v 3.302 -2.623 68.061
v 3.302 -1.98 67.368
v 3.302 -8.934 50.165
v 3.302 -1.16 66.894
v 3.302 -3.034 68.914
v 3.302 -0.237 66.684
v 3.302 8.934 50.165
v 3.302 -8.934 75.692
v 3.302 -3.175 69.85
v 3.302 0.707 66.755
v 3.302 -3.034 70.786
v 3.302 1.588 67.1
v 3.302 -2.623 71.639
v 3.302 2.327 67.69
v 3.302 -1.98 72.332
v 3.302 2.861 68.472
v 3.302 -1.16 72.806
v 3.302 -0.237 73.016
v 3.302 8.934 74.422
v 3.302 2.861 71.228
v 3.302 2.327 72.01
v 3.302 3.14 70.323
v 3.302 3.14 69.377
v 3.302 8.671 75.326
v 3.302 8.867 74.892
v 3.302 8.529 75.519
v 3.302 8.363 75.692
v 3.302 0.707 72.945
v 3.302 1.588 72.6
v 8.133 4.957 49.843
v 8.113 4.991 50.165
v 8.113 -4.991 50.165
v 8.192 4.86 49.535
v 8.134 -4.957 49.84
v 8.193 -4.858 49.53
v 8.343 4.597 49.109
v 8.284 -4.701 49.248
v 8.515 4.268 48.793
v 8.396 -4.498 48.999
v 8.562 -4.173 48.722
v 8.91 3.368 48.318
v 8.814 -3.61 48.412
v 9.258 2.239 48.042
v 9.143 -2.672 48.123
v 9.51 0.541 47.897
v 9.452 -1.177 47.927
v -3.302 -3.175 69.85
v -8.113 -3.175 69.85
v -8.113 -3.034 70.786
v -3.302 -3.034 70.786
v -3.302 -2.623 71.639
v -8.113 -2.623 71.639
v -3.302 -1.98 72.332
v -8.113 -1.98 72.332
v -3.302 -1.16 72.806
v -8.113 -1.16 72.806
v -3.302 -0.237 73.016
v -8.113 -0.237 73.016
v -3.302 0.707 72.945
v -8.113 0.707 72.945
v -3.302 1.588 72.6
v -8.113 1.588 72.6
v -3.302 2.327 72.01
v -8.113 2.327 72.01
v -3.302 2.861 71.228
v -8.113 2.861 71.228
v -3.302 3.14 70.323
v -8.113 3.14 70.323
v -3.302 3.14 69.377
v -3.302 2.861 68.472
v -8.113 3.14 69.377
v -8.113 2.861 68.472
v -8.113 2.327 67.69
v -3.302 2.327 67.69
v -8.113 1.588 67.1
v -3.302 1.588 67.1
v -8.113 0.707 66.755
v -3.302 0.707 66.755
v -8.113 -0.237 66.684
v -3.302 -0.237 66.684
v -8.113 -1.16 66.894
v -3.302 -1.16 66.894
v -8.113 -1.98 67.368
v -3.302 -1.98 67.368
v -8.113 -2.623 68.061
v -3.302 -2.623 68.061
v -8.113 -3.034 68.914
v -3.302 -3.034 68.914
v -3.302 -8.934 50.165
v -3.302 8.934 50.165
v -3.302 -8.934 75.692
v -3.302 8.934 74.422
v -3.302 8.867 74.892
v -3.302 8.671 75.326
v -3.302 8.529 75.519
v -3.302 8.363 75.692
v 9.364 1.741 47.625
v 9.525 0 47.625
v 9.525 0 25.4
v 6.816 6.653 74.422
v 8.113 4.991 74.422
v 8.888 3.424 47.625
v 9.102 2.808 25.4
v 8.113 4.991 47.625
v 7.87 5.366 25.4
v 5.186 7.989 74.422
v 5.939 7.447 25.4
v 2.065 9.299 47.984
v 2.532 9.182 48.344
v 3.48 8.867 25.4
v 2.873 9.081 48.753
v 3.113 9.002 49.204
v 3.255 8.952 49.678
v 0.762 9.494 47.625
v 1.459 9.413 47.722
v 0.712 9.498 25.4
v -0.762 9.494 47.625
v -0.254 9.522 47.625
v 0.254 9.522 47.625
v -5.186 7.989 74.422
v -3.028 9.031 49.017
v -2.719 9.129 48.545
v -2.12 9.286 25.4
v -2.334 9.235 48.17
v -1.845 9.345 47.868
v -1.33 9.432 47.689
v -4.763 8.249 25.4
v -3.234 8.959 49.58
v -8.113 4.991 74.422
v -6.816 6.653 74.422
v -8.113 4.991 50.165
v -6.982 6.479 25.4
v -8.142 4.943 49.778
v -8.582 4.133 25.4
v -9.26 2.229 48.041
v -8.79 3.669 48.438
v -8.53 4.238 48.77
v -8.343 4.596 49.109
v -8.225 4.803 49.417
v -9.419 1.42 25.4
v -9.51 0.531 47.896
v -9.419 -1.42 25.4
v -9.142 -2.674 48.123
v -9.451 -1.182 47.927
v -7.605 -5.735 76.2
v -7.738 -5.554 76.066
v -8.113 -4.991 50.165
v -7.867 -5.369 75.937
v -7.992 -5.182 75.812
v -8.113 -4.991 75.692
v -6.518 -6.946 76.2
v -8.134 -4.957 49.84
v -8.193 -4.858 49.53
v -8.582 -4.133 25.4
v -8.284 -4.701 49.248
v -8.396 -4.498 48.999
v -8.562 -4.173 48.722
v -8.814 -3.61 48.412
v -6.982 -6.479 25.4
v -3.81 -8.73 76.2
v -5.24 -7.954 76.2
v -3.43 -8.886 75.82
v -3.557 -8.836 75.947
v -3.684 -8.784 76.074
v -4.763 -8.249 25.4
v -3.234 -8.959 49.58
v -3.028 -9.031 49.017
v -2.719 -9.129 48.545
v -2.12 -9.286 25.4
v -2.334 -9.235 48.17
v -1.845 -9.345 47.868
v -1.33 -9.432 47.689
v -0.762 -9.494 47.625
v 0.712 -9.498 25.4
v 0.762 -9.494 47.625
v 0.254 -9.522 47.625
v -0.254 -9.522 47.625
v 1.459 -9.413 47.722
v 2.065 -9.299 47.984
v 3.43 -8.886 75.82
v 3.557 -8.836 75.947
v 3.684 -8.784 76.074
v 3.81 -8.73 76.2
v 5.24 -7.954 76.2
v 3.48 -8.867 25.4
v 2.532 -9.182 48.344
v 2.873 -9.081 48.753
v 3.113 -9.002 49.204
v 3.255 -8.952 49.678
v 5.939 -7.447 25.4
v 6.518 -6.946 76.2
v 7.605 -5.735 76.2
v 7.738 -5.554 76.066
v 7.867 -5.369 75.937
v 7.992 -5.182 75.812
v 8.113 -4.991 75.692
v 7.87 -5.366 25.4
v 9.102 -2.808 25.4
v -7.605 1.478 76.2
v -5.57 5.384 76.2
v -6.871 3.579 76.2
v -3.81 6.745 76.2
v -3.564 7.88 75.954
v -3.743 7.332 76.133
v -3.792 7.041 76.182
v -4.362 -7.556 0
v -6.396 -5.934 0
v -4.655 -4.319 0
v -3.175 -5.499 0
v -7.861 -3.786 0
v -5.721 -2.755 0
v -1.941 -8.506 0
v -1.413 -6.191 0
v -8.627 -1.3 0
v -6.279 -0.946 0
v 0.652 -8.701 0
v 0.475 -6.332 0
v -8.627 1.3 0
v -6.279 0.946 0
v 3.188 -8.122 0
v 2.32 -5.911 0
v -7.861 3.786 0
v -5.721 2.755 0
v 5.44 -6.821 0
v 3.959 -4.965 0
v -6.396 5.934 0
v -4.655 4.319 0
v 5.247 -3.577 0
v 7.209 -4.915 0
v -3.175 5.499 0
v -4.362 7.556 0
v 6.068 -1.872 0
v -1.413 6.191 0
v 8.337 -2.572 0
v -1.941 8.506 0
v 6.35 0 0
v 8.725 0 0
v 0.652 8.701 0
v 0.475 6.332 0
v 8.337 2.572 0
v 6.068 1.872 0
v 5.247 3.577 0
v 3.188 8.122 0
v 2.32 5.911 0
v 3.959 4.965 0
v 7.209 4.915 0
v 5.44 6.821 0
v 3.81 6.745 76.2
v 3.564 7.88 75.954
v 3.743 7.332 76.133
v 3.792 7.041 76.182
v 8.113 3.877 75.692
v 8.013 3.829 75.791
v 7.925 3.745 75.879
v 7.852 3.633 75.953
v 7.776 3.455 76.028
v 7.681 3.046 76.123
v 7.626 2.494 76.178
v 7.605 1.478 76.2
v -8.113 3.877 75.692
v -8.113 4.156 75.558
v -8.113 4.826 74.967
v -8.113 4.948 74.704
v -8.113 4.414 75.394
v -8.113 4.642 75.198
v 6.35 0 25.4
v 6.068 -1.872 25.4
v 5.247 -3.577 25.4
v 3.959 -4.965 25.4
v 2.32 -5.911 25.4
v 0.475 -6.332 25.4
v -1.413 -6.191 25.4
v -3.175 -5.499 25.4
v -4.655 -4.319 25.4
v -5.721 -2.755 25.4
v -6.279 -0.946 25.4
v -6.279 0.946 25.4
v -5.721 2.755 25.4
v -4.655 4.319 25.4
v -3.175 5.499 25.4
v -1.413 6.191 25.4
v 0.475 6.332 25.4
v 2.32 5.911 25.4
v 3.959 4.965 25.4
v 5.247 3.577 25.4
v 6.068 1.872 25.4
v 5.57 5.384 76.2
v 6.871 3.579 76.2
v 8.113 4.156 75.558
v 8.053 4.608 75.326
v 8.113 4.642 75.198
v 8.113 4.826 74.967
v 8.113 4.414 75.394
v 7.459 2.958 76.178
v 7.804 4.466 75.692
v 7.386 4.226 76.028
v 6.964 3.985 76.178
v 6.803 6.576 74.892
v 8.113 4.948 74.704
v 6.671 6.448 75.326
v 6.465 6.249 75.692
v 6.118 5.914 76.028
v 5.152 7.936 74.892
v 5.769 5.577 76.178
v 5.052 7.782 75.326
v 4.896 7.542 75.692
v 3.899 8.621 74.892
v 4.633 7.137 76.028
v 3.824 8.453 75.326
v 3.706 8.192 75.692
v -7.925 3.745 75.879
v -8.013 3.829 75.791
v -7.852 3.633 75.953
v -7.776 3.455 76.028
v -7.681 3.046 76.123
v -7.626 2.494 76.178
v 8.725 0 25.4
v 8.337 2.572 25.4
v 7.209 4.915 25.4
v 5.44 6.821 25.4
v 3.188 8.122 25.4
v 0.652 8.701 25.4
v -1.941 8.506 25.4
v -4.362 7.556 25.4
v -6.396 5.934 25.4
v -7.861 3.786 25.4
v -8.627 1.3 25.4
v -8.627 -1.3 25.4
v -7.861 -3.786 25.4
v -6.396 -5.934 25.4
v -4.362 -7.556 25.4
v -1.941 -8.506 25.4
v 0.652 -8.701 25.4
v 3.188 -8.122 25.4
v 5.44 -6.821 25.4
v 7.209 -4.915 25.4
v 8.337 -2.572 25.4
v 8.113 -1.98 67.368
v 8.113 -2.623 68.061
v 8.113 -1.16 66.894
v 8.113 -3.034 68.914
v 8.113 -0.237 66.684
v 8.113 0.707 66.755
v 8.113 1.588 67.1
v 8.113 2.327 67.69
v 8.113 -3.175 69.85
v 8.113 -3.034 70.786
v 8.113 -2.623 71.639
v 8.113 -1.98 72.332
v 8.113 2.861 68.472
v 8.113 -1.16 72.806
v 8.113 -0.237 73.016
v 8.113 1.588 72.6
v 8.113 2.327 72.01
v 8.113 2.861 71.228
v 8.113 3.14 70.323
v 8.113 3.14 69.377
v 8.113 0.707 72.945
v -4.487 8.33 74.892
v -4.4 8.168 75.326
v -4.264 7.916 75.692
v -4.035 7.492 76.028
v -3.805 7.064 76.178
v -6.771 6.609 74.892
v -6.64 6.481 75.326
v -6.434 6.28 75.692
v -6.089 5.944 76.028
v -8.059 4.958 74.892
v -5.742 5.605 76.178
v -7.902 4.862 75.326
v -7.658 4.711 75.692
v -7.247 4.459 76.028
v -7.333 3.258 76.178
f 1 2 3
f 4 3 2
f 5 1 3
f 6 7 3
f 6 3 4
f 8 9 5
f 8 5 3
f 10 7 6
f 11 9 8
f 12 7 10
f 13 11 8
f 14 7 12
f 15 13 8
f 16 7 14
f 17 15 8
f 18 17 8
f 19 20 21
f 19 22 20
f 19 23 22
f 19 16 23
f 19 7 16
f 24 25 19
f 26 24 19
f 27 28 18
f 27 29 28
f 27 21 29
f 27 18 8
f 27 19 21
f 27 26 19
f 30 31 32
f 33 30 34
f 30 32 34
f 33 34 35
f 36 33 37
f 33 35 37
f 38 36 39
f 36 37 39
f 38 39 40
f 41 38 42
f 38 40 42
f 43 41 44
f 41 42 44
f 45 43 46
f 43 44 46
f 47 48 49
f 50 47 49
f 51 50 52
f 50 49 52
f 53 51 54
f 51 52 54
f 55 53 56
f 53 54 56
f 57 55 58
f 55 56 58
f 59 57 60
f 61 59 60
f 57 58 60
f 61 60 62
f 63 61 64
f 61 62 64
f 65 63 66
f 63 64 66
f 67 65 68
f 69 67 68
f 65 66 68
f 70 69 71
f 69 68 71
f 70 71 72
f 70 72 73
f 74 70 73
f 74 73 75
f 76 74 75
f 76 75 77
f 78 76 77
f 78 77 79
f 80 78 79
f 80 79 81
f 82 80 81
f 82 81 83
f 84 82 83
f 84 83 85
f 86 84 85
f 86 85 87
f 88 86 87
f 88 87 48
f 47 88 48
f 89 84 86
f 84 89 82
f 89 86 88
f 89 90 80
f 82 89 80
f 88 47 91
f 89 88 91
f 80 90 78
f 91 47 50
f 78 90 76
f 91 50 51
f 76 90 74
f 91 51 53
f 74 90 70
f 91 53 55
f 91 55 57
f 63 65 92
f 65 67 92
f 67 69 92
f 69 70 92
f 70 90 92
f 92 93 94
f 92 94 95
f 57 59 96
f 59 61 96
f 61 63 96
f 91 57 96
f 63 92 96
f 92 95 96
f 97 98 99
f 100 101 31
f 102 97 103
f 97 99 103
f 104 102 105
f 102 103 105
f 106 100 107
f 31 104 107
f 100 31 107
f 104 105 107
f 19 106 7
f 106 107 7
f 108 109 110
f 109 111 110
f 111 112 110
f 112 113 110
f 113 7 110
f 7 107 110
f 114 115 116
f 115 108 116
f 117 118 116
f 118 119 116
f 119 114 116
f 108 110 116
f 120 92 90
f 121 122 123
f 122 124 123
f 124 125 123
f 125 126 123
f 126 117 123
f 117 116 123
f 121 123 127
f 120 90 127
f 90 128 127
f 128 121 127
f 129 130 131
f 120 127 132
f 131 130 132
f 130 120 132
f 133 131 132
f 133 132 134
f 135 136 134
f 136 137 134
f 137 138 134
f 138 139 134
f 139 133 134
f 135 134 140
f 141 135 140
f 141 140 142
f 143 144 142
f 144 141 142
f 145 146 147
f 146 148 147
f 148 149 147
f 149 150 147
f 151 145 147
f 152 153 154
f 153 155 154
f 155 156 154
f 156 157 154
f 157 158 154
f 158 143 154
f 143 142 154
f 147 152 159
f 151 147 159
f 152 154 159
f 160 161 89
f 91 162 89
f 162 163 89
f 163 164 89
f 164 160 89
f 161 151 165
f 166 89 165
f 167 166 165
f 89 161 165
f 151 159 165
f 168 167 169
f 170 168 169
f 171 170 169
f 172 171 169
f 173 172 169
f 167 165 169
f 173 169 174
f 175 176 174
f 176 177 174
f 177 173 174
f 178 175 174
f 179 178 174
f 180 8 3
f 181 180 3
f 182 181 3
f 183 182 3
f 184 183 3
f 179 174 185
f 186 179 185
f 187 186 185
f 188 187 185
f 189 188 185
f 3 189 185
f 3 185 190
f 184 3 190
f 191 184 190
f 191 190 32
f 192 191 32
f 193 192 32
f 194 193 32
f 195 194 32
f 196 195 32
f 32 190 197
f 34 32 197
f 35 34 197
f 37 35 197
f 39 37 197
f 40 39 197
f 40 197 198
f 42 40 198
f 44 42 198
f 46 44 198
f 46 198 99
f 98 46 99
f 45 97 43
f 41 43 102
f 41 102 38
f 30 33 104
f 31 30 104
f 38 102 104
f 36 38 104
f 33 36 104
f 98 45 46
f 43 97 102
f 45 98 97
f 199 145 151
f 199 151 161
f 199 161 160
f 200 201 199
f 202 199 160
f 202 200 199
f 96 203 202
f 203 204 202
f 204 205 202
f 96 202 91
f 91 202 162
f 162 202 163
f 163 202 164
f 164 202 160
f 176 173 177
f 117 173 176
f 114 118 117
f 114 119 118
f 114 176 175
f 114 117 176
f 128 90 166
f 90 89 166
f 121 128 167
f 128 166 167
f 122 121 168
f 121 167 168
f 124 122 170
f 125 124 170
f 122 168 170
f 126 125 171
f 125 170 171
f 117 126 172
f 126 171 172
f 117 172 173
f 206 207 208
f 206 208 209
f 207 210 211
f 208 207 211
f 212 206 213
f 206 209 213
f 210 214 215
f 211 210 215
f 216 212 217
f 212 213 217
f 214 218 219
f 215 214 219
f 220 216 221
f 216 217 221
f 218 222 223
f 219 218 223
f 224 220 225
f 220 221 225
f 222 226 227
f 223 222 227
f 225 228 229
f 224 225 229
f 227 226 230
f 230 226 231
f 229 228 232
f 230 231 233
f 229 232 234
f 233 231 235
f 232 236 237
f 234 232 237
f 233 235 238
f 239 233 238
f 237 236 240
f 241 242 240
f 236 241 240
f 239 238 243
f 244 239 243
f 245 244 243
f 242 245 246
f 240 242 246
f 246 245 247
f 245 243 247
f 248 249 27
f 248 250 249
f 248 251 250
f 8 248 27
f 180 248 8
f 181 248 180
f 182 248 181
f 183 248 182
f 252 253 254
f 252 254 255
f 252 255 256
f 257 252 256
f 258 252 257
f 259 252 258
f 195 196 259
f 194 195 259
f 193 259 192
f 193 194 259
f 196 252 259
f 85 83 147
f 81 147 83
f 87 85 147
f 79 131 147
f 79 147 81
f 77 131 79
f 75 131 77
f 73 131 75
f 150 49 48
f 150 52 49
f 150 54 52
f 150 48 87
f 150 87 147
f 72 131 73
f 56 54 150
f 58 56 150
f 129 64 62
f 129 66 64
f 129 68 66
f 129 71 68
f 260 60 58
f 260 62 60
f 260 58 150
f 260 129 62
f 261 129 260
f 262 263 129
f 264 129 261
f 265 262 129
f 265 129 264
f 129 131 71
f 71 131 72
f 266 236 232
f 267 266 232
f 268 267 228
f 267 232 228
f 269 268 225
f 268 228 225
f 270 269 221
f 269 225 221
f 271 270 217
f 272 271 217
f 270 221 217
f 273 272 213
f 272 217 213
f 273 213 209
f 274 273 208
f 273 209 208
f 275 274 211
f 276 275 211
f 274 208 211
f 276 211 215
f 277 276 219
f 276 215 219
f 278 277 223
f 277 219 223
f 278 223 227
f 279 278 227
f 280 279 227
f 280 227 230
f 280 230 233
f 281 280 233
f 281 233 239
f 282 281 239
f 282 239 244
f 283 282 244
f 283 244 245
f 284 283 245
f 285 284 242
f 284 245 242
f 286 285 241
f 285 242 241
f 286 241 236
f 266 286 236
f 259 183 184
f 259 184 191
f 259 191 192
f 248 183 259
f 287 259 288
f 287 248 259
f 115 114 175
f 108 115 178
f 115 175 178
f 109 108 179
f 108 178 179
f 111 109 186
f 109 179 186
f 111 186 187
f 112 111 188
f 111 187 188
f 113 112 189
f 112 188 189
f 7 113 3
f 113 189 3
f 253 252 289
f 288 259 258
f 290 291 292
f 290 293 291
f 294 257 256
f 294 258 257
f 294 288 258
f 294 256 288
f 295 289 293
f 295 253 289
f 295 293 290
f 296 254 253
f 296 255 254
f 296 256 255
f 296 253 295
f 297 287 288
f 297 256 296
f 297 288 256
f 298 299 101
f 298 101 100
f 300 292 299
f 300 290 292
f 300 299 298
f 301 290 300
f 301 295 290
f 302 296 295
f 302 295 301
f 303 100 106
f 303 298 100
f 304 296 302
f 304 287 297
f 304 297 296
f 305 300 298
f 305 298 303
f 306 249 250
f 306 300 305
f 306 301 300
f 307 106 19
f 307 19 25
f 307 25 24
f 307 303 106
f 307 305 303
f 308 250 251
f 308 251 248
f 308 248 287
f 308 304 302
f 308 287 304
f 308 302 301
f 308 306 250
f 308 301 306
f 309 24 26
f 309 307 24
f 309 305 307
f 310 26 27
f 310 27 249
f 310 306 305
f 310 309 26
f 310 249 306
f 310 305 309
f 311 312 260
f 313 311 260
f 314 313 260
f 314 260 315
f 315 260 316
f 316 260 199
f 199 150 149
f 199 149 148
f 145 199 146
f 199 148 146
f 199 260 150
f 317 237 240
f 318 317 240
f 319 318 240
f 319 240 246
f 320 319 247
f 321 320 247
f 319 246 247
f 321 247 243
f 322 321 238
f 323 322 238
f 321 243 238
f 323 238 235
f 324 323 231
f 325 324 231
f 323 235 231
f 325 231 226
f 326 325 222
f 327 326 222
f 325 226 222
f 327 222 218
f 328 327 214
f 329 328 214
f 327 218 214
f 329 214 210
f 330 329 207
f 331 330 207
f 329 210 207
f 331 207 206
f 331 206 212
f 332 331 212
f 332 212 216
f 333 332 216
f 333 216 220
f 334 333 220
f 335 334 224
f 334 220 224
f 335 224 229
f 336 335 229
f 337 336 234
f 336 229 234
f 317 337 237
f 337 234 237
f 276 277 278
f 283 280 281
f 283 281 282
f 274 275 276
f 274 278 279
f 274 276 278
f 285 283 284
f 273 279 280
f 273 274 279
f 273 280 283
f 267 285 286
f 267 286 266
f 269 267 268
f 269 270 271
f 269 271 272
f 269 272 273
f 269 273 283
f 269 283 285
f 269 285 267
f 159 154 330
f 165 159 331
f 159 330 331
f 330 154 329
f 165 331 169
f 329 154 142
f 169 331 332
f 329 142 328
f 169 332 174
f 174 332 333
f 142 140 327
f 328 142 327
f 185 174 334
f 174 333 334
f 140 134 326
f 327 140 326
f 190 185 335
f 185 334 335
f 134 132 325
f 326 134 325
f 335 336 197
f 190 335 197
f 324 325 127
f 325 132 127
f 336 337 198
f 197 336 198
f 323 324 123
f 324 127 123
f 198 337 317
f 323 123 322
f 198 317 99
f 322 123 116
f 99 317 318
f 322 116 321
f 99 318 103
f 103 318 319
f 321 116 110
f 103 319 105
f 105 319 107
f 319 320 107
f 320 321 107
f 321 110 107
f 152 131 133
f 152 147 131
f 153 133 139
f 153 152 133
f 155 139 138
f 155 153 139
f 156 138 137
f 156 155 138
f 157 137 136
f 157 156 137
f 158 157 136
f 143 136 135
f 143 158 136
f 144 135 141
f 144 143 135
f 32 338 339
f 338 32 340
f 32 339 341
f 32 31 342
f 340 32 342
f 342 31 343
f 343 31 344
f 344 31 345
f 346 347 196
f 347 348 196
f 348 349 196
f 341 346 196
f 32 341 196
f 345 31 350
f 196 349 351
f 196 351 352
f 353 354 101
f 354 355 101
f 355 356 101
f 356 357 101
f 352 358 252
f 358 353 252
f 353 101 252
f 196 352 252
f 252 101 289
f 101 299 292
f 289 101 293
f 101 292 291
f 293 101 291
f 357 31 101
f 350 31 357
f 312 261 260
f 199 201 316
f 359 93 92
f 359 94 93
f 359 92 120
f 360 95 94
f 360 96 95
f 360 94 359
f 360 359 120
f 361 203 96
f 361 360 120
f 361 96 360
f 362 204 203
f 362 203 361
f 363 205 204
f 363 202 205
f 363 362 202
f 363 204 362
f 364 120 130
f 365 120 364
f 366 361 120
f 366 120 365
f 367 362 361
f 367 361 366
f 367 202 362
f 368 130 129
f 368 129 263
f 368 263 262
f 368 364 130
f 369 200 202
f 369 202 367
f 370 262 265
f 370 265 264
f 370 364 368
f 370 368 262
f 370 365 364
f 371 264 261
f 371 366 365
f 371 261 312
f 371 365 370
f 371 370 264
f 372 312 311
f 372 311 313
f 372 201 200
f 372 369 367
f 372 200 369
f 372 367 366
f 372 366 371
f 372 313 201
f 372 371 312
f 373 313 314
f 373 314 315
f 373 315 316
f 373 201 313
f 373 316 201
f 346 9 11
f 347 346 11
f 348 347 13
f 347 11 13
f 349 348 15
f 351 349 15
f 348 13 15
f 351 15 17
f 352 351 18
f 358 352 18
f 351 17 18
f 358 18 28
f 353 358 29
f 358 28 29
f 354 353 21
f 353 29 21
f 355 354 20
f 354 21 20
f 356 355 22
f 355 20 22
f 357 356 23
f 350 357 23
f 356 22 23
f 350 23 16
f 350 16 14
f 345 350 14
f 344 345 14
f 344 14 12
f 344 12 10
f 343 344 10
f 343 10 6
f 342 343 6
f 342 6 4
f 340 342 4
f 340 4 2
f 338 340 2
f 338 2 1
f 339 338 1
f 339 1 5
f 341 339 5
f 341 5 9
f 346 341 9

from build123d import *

# Parameters (mm, degrees)
F0_R           = 8.7249
F1_DEPTH       = 25.4
F2_R           = 9.525
F3_DEPTH       = 50.8
F4_W           = 6.604
F4_H           = 31.75
F4_W_2         = 7.7840778498
F4_H_2         = 37.4901928008
F5_DEPTH       = 25.4
F5_DEPTH_BACK  = 25.4
F6_R           = 2.54
F7_SIZE        = 0.508
F8_T4_DEPTH    = 22.6820176921
F8_S5_R        = 9.525
F8_T6_DEPTH    = 13
F8_T10_DEPTH   = 22.6820176921
F8_S11_R       = 9.525
F8_T12_DEPTH   = 13
F9_R           = 3.175
F10_DEPTH      = 25.4
F10_DEPTH_BACK = 25.4
F11_R          = 1.778
F12_R          = 6.35
F13_DEPTH      = 25.4


# Not quite as in the source:
# - a fillet or chamfer that OpenCascade refuses, or shapes differently, is made with other operations: its cross-section is extruded or revolved along the edge and cut away or added


with BuildPart() as f1:
    # F0 (on Top) → F1 (new body)
    with BuildSketch(Plane.XY):
        Circle(F0_R)
    extrude(amount=F1_DEPTH)

    # F2 (on face) → F3 (join)
    with BuildSketch(Plane.XY.offset(25.4)):
        Circle(F2_R)
    extrude(amount=F3_DEPTH)

    # F4 (on Front) → F5 (cut, two sides)
    with BuildSketch(Plane.XZ) as f5_sk:
        with Locations((0, 63.5)):
            Rectangle(F4_W, F4_H)
        with Locations((12.0047114623, 66.3700964004)):
            Rectangle(F4_W_2, F4_H_2)
        with Locations((-12.0047114623, 66.3700964004)):
            Rectangle(F4_W_2, F4_H_2)
    extrude(amount=-F5_DEPTH, mode=Mode.SUBTRACT)
    extrude(f5_sk.sketch, amount=F5_DEPTH_BACK, mode=Mode.SUBTRACT)

    # F6
    f6_edges = [f1.edges().sort_by_distance(p)[0] for p in [
        (-3.302, 0, 47.625),
        (3.302, 0, 47.625),
    ]]
    fillet(f6_edges, radius=F6_R)

    # F7
    f7_edges = [f1.edges().sort_by_distance(p)[0] for p in [
        (3.302, 0, 76.2),
        (-3.302, 0, 76.2),
        (-8.112673, 0, 76.2),
        (8.112673, 0, 76.2),
    ]]
    chamfer(f7_edges, length=F7_SIZE)

    # F8: fillet of radius 2.54 on 2 edges, made by hand


with BuildPart() as f8_tool2:
    # F8_s3 → F8_t4 (new body)
    with BuildSketch(Plane.XZ.offset(11.341008846)):
        with BuildLine():
            ThreePointArc((8.1126725374, 50.165), (8.8566213132, 48.3689487758), (10.6526725374, 47.625))
            Line((10.6526725374, 47.625), (8.1126725374, 47.625))
            Line((8.1126725374, 47.625), (8.1126725374, 50.165))
        make_face()
    extrude(amount=-F8_T4_DEPTH)

    # F8_s5 → F8_t6 (intersect, symmetric)
    with BuildSketch(Plane.XY.offset(48.9)):
        Circle(F8_S5_R)
    extrude(amount=F8_T6_DEPTH, both=True, mode=Mode.INTERSECT)


with BuildPart() as f1_1:
    add(f1.part)

    # F8_t1: union F8_tool2
    add(f8_tool2.part)


with BuildPart() as f8_tool8:
    # F8_s9 → F8_t10 (new body)
    with BuildSketch(Plane.XZ.offset(11.341008846)):
        with BuildLine():
            ThreePointArc((-8.1126725374, 50.165), (-8.8566213132, 48.3689487758), (-10.6526725374, 47.625))
            Line((-10.6526725374, 47.625), (-8.1126725374, 47.625))
            Line((-8.1126725374, 47.625), (-8.1126725374, 50.165))
        make_face()
    extrude(amount=-F8_T10_DEPTH)

    # F8_s11 → F8_t12 (intersect, symmetric)
    with BuildSketch(Plane.XY.offset(48.9)):
        Circle(F8_S11_R)
    extrude(amount=F8_T12_DEPTH, both=True, mode=Mode.INTERSECT)


with BuildPart() as f1_2:
    add(f1_1.part)

    # F8_t7: union F8_tool8
    add(f8_tool8.part)

    # F9 (on face) → F10 (cut, two sides)
    with BuildSketch(Plane(origin=(-8.1126725374, 0, 0), x_dir=(0, -1, 0), z_dir=(-1, 0, 0))) as f10_sk:
        with Locations((0, 69.85)):
            Circle(F9_R)
    extrude(amount=-F10_DEPTH, mode=Mode.SUBTRACT)
    extrude(f10_sk.sketch, amount=F10_DEPTH_BACK, mode=Mode.SUBTRACT)

    # F11
    f11_edges = [f1_2.edges().sort_by_distance(p)[0] for p in [
        (-5.900452, 7.477318, 76.2),
        (5.900452, 7.477318, 76.2),
    ]]
    fillet(f11_edges, radius=F11_R)

    # F12 (on face) → F13 (cut)
    with BuildSketch(Plane(origin=(0, 0, 0), x_dir=(1, 0, 0), z_dir=(0, 0, -1))):
        Circle(F12_R)
    extrude(amount=-F13_DEPTH, mode=Mode.SUBTRACT)


solid = f1_2.part
